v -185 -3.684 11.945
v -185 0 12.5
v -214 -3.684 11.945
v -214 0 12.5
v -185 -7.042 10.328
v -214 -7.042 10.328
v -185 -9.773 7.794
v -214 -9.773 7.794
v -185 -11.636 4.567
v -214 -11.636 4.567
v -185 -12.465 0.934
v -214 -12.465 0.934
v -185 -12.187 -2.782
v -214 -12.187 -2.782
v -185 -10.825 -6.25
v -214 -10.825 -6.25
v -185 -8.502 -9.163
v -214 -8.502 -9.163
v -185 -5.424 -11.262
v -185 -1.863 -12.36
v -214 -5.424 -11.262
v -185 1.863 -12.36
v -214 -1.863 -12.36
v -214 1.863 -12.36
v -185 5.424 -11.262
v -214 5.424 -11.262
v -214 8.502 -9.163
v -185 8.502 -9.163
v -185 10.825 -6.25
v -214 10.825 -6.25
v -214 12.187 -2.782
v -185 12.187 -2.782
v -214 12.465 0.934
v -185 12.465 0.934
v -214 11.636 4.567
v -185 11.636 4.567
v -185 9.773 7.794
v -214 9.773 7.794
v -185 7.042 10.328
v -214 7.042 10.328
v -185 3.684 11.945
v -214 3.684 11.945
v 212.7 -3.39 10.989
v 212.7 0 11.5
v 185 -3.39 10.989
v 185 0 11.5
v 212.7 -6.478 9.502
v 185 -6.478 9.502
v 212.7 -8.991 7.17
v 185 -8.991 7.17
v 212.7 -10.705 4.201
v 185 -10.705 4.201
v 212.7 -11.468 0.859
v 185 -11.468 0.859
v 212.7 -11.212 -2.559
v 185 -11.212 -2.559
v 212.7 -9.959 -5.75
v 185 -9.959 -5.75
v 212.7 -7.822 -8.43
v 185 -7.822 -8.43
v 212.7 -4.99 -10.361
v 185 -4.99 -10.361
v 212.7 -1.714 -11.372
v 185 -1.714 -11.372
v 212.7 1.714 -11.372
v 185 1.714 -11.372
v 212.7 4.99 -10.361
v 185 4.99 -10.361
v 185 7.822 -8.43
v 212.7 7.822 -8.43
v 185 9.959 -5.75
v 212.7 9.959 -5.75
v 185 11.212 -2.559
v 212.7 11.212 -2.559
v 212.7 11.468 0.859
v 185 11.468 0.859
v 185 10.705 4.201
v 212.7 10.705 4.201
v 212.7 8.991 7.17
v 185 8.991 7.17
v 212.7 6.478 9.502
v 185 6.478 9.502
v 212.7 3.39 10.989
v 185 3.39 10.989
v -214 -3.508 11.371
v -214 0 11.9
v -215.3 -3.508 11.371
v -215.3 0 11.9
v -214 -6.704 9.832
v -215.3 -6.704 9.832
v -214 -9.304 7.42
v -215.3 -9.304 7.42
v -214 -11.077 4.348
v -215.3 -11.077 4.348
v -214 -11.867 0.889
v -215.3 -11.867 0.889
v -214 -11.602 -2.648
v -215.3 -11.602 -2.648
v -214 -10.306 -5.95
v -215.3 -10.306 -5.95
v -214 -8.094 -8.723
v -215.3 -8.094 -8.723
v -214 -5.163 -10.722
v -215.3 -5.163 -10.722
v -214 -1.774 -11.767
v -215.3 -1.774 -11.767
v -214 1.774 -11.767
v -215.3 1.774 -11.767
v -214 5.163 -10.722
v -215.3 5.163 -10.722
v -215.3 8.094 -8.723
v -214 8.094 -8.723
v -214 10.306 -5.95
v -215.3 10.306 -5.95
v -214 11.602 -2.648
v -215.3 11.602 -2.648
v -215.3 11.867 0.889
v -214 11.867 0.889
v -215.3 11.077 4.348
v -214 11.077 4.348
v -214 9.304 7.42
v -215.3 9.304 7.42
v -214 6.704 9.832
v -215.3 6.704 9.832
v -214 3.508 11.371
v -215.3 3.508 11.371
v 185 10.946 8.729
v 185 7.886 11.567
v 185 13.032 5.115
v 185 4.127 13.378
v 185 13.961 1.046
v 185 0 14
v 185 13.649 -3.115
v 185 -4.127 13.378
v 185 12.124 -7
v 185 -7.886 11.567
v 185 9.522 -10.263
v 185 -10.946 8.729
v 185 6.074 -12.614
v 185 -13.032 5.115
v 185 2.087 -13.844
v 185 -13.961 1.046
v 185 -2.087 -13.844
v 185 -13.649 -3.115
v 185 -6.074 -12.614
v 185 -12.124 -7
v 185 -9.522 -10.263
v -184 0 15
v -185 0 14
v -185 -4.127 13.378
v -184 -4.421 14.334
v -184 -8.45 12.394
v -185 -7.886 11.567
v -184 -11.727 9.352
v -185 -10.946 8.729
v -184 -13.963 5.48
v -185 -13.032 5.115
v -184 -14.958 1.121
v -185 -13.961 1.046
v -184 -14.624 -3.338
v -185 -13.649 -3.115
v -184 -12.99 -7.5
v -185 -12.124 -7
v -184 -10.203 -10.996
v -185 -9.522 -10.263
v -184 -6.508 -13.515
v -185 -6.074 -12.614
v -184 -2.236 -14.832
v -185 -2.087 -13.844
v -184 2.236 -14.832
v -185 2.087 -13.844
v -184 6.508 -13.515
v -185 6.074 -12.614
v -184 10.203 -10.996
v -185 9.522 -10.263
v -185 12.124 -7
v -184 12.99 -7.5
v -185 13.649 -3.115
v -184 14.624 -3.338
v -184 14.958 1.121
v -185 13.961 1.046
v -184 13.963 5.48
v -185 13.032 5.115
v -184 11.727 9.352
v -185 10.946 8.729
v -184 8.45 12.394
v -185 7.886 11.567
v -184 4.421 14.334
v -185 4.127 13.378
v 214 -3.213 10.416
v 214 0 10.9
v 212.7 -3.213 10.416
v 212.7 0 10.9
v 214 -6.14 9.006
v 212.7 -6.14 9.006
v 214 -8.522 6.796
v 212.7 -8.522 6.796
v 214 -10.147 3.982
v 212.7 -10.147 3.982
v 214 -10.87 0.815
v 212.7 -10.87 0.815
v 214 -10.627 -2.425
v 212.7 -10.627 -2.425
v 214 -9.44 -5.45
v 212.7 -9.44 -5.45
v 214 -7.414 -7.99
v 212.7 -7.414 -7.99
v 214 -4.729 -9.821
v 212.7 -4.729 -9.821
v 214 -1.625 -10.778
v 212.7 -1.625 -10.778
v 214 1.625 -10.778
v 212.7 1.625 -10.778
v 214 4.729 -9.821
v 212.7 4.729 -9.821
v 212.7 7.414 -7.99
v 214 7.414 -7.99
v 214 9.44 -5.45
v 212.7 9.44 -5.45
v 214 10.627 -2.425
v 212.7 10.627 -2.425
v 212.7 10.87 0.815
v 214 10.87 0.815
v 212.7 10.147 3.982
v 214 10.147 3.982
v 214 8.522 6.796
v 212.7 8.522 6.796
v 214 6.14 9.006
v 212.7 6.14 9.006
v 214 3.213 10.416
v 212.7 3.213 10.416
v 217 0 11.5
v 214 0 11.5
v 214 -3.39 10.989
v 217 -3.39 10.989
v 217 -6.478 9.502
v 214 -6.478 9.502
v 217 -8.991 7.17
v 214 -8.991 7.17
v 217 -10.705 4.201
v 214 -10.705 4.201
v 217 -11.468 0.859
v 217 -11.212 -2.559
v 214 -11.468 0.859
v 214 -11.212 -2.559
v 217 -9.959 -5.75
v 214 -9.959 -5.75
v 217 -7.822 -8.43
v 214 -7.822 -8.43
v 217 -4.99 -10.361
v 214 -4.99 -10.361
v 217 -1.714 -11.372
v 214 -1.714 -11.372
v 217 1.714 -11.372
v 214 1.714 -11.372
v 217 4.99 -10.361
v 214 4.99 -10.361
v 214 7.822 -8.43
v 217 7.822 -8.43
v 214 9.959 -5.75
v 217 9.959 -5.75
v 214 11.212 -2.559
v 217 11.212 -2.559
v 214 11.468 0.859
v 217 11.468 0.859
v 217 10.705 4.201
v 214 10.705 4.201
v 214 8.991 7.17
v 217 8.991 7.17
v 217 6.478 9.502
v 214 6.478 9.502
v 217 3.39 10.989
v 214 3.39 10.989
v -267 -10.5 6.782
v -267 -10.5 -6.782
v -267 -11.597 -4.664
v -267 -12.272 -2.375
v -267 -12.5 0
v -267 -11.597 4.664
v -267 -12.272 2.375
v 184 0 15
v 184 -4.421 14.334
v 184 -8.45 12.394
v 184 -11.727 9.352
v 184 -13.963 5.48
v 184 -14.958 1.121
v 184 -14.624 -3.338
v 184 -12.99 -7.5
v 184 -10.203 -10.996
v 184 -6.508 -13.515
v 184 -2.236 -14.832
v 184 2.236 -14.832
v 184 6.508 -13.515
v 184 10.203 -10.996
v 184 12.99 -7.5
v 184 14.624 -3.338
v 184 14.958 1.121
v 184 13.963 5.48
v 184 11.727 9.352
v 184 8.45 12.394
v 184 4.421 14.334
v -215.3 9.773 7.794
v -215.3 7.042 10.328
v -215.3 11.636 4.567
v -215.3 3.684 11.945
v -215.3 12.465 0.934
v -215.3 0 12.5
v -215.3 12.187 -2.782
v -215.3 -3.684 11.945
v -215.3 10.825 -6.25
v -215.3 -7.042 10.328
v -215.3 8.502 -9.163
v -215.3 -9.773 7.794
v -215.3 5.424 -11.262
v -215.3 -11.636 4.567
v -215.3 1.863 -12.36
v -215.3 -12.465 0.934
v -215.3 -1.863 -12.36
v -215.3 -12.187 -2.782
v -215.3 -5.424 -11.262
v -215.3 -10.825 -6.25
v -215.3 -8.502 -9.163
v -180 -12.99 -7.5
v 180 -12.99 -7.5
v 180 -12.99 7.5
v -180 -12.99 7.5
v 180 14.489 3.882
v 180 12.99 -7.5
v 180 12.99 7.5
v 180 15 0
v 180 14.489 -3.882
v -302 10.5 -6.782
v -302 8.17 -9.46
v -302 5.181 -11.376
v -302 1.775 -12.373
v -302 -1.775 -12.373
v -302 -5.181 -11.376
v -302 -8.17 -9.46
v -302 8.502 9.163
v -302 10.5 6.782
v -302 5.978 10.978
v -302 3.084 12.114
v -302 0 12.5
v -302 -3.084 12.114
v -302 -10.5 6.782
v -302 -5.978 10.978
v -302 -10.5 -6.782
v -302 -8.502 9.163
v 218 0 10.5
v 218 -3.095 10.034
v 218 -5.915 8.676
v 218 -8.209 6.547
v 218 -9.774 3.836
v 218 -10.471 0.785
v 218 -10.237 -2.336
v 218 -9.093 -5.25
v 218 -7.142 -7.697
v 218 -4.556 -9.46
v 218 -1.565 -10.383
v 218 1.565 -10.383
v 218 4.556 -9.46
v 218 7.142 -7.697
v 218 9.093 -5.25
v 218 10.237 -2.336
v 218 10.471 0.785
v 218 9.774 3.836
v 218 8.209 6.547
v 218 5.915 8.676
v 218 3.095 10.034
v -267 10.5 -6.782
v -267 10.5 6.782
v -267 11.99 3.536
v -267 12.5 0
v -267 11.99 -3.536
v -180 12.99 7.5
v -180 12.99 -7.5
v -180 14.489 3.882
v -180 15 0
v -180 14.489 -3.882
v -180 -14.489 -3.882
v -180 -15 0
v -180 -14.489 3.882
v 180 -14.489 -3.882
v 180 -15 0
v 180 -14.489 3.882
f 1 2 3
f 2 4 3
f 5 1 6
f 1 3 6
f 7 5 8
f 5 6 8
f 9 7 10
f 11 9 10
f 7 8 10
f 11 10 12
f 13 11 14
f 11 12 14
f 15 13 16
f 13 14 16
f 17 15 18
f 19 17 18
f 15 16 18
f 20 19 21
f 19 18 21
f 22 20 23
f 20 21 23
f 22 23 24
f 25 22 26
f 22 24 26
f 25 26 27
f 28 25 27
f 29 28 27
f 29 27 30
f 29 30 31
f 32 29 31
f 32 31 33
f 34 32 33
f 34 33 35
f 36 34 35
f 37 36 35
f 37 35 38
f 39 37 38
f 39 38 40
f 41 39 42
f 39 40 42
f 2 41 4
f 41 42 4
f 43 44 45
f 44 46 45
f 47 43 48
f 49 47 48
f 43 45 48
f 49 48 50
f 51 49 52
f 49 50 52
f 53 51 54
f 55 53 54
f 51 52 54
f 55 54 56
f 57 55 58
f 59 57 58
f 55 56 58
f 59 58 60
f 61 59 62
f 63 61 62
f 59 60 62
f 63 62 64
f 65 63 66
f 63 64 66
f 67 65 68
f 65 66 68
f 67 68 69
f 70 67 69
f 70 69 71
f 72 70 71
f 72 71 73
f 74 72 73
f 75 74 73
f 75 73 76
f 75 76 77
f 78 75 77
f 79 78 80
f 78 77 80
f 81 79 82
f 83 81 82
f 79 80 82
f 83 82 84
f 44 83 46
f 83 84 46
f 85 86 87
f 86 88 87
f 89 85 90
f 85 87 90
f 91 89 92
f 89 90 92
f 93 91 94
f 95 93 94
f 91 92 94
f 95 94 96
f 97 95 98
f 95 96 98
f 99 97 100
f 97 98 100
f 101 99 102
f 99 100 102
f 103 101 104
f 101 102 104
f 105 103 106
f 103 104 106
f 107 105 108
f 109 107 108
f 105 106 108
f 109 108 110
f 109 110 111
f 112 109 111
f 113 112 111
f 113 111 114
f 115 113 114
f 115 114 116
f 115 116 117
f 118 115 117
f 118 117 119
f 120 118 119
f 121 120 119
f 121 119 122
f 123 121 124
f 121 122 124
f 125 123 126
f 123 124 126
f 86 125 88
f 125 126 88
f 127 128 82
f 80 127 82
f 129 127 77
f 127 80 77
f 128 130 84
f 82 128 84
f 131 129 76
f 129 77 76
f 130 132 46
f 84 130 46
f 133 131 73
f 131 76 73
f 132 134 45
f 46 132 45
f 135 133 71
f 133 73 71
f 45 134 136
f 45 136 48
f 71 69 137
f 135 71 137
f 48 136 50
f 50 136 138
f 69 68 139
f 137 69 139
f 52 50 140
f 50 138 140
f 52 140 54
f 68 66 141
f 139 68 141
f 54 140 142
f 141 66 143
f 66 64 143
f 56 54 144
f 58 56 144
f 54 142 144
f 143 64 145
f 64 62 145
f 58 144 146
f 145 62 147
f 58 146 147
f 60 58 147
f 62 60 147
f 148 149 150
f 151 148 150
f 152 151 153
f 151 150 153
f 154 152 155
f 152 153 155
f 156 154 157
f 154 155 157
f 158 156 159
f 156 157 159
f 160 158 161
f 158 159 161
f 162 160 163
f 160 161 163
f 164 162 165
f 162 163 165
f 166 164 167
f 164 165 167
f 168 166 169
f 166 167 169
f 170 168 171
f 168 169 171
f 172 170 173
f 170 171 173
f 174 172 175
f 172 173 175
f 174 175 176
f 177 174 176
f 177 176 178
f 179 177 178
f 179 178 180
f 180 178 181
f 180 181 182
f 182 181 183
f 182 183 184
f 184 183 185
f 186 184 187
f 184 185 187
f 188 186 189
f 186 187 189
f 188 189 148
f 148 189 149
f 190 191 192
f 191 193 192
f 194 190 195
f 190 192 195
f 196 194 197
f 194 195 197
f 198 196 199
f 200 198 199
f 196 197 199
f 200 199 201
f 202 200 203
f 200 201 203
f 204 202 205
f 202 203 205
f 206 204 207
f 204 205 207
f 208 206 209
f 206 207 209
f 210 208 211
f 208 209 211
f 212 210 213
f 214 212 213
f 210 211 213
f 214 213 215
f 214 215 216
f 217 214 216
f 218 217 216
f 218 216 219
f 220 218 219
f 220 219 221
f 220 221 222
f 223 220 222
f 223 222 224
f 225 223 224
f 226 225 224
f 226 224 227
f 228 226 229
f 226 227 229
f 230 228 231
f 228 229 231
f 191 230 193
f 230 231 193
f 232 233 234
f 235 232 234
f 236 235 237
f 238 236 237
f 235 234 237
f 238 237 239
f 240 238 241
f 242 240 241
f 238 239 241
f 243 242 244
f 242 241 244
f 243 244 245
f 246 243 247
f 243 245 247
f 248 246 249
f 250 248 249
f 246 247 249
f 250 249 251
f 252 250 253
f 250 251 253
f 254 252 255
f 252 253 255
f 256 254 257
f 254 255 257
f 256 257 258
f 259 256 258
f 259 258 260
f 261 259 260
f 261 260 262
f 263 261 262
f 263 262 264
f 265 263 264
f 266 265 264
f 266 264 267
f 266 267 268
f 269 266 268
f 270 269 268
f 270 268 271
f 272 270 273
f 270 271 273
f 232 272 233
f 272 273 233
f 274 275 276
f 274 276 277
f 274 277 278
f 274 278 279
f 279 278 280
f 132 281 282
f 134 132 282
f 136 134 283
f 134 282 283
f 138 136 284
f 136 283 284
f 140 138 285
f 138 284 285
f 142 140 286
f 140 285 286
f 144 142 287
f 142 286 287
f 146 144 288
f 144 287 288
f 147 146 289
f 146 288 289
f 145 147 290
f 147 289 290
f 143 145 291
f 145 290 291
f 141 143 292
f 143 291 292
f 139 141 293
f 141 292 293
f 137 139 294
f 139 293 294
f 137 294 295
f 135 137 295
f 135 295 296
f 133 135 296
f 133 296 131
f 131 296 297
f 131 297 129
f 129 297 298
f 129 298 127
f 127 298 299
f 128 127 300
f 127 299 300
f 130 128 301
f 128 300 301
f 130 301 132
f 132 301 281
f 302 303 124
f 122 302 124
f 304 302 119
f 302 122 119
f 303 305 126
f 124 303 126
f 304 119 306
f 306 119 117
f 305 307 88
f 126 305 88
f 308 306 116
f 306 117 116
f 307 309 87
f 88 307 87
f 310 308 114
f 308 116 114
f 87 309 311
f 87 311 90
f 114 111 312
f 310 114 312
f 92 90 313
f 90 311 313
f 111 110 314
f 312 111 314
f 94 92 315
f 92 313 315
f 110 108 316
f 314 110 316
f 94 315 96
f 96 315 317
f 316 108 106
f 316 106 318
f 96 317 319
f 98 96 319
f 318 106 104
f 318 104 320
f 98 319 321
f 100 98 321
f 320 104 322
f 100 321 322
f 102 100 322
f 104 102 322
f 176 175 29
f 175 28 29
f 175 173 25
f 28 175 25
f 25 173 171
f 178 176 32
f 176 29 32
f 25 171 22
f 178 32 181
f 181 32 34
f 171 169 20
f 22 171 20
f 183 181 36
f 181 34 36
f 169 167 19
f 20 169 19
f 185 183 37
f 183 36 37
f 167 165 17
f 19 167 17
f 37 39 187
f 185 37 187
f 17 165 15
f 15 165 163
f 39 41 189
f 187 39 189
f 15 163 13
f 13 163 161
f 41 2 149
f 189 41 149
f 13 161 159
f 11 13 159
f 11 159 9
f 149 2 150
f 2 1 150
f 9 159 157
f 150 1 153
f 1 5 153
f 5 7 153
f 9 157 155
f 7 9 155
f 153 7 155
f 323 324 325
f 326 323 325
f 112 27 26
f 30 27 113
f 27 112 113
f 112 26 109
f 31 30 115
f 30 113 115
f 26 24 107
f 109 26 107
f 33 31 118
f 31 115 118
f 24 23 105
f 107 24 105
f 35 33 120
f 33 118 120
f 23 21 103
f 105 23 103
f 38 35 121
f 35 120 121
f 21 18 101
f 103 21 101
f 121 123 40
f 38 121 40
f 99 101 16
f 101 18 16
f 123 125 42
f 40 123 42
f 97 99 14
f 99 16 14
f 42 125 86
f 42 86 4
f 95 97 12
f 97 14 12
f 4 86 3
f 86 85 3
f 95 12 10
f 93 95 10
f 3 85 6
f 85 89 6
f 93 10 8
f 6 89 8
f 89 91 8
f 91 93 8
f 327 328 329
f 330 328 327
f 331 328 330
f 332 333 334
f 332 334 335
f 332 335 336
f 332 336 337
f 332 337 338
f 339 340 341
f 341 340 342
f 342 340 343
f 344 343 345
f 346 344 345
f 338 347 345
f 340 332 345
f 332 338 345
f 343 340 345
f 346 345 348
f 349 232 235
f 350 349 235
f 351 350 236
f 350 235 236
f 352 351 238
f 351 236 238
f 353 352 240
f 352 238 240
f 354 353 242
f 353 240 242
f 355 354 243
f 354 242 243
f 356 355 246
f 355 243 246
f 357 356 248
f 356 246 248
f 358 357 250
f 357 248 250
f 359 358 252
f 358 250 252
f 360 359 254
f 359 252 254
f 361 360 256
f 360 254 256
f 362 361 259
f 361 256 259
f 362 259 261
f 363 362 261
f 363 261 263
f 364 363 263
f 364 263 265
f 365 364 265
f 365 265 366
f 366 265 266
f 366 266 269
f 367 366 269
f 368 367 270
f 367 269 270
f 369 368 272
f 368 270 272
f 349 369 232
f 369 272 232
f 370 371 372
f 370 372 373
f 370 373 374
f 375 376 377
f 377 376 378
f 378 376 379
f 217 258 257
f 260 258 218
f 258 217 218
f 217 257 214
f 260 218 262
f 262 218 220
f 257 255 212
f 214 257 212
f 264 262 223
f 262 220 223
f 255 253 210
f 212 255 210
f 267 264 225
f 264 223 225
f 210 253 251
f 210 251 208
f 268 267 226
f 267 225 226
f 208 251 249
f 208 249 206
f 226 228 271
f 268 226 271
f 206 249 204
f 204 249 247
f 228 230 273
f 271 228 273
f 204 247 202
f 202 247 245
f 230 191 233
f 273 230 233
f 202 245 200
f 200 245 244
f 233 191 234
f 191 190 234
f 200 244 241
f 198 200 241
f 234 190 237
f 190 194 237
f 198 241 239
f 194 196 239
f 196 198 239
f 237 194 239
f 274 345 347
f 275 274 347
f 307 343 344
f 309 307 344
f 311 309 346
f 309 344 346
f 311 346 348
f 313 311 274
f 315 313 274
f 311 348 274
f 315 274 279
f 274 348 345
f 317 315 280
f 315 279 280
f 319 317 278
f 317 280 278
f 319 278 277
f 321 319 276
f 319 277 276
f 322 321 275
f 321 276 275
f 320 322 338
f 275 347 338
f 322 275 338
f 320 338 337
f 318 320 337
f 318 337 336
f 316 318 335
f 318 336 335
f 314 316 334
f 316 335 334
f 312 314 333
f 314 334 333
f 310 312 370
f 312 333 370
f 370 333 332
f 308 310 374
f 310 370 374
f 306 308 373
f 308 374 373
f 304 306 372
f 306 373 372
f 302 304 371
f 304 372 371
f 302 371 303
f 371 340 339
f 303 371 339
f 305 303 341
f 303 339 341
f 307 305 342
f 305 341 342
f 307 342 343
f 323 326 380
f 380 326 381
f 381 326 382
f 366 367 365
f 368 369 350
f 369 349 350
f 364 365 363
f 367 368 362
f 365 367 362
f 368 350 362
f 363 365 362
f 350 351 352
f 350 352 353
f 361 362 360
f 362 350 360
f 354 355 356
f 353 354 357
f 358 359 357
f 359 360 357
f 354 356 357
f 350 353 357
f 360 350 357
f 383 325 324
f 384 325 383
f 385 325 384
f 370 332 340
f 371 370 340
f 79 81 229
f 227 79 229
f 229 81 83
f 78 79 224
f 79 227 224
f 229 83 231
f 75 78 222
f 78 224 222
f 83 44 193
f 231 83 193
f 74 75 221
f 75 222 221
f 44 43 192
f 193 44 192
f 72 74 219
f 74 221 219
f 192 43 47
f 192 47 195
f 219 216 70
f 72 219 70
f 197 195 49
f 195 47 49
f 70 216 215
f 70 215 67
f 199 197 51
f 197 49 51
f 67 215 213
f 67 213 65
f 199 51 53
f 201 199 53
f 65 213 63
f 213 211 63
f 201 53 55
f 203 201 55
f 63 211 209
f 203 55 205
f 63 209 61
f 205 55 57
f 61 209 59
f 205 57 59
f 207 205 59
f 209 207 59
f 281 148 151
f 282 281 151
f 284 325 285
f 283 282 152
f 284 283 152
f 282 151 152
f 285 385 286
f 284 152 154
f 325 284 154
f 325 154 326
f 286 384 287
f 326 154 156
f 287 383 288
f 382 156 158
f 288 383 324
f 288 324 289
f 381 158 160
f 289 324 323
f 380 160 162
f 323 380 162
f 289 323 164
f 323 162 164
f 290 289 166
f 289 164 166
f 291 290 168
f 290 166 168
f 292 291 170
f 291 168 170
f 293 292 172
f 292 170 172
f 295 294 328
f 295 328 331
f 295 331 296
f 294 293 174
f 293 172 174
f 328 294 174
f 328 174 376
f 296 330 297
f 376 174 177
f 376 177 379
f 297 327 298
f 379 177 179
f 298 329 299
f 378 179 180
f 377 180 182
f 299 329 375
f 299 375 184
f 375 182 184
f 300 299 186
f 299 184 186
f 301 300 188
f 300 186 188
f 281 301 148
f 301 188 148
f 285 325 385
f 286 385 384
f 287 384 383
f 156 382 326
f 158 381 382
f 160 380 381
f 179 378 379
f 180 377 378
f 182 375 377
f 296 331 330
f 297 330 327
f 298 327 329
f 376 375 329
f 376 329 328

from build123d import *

# Parameters (mm, degrees)
F3_DEPTH = 180
F5_DEPTH = 35
F6_SIZE  = 1


with BuildPart() as f1:
    # F0 (on Front) → F1 (revolve)
    with BuildSketch(Plane.XZ):
        Polygon((-302, 6.5), (-302, 0), (-185, 0), (175, 0), (218, 0), (218, 11.5), (214, 11.5), (214, 10.9), (212.7, 10.9), (212.7, 11.5), (185, 11.5), (185, 15), (-185, 15), (-185, 12.5), (-214, 12.5), (-214, 11.9), (-215.3, 11.9), (-215.3, 12.5), (-302, 12.5), align=None)
    revolve(axis=Axis((-5, 0, 0), (1, 0, 0)))

    # F2 (on Right) → F3 (cut, symmetric)
    with BuildSketch(Plane.YZ):
        with BuildLine():
            Line((-12.9903810568, -7.5), (-12.9903810568, 7.5))
            ThreePointArc((-12.9903810568, 7.5), (-15, 0), (-12.9903810568, -7.5))
        make_face()
        with BuildLine():
            ThreePointArc((12.9903810568, -7.5), (15, 0), (12.9903810568, 7.5))
            Line((12.9903810568, 7.5), (12.9903810568, -7.5))
        make_face()
    extrude(amount=F3_DEPTH, both=True, mode=Mode.SUBTRACT)

    # F4 (on face) → F5 (cut)
    with BuildSketch(Plane(origin=(-302, 0, 0), x_dir=(0, -1, 0), z_dir=(-1, 0, 0))):
        with BuildLine():
            Line((-10.5, -6.7823299831), (-10.5, 6.7823299831))
            ThreePointArc((-10.5, 6.7823299831), (-12.5, 0), (-10.5, -6.7823299831))
        make_face()
        with BuildLine():
            ThreePointArc((12.5, 0), (11.9895788083, 3.5355339059), (10.5, 6.7823299831))
            Line((10.5, 6.7823299831), (10.5, -6.7823299831))
            ThreePointArc((10.5, -6.7823299831), (11.9895788083, -3.5355339059), (12.5, 0))
        make_face()
    extrude(amount=-F5_DEPTH, mode=Mode.SUBTRACT)

    # F6
    f6_edges = [f1.edges().sort_by_distance(p)[0] for p in [
        (-185, 0, -15),
        (185, 0, -15),
        (218, 0, -11.5),
    ]]
    chamfer(f6_edges, length=F6_SIZE)


solid = f1.part
